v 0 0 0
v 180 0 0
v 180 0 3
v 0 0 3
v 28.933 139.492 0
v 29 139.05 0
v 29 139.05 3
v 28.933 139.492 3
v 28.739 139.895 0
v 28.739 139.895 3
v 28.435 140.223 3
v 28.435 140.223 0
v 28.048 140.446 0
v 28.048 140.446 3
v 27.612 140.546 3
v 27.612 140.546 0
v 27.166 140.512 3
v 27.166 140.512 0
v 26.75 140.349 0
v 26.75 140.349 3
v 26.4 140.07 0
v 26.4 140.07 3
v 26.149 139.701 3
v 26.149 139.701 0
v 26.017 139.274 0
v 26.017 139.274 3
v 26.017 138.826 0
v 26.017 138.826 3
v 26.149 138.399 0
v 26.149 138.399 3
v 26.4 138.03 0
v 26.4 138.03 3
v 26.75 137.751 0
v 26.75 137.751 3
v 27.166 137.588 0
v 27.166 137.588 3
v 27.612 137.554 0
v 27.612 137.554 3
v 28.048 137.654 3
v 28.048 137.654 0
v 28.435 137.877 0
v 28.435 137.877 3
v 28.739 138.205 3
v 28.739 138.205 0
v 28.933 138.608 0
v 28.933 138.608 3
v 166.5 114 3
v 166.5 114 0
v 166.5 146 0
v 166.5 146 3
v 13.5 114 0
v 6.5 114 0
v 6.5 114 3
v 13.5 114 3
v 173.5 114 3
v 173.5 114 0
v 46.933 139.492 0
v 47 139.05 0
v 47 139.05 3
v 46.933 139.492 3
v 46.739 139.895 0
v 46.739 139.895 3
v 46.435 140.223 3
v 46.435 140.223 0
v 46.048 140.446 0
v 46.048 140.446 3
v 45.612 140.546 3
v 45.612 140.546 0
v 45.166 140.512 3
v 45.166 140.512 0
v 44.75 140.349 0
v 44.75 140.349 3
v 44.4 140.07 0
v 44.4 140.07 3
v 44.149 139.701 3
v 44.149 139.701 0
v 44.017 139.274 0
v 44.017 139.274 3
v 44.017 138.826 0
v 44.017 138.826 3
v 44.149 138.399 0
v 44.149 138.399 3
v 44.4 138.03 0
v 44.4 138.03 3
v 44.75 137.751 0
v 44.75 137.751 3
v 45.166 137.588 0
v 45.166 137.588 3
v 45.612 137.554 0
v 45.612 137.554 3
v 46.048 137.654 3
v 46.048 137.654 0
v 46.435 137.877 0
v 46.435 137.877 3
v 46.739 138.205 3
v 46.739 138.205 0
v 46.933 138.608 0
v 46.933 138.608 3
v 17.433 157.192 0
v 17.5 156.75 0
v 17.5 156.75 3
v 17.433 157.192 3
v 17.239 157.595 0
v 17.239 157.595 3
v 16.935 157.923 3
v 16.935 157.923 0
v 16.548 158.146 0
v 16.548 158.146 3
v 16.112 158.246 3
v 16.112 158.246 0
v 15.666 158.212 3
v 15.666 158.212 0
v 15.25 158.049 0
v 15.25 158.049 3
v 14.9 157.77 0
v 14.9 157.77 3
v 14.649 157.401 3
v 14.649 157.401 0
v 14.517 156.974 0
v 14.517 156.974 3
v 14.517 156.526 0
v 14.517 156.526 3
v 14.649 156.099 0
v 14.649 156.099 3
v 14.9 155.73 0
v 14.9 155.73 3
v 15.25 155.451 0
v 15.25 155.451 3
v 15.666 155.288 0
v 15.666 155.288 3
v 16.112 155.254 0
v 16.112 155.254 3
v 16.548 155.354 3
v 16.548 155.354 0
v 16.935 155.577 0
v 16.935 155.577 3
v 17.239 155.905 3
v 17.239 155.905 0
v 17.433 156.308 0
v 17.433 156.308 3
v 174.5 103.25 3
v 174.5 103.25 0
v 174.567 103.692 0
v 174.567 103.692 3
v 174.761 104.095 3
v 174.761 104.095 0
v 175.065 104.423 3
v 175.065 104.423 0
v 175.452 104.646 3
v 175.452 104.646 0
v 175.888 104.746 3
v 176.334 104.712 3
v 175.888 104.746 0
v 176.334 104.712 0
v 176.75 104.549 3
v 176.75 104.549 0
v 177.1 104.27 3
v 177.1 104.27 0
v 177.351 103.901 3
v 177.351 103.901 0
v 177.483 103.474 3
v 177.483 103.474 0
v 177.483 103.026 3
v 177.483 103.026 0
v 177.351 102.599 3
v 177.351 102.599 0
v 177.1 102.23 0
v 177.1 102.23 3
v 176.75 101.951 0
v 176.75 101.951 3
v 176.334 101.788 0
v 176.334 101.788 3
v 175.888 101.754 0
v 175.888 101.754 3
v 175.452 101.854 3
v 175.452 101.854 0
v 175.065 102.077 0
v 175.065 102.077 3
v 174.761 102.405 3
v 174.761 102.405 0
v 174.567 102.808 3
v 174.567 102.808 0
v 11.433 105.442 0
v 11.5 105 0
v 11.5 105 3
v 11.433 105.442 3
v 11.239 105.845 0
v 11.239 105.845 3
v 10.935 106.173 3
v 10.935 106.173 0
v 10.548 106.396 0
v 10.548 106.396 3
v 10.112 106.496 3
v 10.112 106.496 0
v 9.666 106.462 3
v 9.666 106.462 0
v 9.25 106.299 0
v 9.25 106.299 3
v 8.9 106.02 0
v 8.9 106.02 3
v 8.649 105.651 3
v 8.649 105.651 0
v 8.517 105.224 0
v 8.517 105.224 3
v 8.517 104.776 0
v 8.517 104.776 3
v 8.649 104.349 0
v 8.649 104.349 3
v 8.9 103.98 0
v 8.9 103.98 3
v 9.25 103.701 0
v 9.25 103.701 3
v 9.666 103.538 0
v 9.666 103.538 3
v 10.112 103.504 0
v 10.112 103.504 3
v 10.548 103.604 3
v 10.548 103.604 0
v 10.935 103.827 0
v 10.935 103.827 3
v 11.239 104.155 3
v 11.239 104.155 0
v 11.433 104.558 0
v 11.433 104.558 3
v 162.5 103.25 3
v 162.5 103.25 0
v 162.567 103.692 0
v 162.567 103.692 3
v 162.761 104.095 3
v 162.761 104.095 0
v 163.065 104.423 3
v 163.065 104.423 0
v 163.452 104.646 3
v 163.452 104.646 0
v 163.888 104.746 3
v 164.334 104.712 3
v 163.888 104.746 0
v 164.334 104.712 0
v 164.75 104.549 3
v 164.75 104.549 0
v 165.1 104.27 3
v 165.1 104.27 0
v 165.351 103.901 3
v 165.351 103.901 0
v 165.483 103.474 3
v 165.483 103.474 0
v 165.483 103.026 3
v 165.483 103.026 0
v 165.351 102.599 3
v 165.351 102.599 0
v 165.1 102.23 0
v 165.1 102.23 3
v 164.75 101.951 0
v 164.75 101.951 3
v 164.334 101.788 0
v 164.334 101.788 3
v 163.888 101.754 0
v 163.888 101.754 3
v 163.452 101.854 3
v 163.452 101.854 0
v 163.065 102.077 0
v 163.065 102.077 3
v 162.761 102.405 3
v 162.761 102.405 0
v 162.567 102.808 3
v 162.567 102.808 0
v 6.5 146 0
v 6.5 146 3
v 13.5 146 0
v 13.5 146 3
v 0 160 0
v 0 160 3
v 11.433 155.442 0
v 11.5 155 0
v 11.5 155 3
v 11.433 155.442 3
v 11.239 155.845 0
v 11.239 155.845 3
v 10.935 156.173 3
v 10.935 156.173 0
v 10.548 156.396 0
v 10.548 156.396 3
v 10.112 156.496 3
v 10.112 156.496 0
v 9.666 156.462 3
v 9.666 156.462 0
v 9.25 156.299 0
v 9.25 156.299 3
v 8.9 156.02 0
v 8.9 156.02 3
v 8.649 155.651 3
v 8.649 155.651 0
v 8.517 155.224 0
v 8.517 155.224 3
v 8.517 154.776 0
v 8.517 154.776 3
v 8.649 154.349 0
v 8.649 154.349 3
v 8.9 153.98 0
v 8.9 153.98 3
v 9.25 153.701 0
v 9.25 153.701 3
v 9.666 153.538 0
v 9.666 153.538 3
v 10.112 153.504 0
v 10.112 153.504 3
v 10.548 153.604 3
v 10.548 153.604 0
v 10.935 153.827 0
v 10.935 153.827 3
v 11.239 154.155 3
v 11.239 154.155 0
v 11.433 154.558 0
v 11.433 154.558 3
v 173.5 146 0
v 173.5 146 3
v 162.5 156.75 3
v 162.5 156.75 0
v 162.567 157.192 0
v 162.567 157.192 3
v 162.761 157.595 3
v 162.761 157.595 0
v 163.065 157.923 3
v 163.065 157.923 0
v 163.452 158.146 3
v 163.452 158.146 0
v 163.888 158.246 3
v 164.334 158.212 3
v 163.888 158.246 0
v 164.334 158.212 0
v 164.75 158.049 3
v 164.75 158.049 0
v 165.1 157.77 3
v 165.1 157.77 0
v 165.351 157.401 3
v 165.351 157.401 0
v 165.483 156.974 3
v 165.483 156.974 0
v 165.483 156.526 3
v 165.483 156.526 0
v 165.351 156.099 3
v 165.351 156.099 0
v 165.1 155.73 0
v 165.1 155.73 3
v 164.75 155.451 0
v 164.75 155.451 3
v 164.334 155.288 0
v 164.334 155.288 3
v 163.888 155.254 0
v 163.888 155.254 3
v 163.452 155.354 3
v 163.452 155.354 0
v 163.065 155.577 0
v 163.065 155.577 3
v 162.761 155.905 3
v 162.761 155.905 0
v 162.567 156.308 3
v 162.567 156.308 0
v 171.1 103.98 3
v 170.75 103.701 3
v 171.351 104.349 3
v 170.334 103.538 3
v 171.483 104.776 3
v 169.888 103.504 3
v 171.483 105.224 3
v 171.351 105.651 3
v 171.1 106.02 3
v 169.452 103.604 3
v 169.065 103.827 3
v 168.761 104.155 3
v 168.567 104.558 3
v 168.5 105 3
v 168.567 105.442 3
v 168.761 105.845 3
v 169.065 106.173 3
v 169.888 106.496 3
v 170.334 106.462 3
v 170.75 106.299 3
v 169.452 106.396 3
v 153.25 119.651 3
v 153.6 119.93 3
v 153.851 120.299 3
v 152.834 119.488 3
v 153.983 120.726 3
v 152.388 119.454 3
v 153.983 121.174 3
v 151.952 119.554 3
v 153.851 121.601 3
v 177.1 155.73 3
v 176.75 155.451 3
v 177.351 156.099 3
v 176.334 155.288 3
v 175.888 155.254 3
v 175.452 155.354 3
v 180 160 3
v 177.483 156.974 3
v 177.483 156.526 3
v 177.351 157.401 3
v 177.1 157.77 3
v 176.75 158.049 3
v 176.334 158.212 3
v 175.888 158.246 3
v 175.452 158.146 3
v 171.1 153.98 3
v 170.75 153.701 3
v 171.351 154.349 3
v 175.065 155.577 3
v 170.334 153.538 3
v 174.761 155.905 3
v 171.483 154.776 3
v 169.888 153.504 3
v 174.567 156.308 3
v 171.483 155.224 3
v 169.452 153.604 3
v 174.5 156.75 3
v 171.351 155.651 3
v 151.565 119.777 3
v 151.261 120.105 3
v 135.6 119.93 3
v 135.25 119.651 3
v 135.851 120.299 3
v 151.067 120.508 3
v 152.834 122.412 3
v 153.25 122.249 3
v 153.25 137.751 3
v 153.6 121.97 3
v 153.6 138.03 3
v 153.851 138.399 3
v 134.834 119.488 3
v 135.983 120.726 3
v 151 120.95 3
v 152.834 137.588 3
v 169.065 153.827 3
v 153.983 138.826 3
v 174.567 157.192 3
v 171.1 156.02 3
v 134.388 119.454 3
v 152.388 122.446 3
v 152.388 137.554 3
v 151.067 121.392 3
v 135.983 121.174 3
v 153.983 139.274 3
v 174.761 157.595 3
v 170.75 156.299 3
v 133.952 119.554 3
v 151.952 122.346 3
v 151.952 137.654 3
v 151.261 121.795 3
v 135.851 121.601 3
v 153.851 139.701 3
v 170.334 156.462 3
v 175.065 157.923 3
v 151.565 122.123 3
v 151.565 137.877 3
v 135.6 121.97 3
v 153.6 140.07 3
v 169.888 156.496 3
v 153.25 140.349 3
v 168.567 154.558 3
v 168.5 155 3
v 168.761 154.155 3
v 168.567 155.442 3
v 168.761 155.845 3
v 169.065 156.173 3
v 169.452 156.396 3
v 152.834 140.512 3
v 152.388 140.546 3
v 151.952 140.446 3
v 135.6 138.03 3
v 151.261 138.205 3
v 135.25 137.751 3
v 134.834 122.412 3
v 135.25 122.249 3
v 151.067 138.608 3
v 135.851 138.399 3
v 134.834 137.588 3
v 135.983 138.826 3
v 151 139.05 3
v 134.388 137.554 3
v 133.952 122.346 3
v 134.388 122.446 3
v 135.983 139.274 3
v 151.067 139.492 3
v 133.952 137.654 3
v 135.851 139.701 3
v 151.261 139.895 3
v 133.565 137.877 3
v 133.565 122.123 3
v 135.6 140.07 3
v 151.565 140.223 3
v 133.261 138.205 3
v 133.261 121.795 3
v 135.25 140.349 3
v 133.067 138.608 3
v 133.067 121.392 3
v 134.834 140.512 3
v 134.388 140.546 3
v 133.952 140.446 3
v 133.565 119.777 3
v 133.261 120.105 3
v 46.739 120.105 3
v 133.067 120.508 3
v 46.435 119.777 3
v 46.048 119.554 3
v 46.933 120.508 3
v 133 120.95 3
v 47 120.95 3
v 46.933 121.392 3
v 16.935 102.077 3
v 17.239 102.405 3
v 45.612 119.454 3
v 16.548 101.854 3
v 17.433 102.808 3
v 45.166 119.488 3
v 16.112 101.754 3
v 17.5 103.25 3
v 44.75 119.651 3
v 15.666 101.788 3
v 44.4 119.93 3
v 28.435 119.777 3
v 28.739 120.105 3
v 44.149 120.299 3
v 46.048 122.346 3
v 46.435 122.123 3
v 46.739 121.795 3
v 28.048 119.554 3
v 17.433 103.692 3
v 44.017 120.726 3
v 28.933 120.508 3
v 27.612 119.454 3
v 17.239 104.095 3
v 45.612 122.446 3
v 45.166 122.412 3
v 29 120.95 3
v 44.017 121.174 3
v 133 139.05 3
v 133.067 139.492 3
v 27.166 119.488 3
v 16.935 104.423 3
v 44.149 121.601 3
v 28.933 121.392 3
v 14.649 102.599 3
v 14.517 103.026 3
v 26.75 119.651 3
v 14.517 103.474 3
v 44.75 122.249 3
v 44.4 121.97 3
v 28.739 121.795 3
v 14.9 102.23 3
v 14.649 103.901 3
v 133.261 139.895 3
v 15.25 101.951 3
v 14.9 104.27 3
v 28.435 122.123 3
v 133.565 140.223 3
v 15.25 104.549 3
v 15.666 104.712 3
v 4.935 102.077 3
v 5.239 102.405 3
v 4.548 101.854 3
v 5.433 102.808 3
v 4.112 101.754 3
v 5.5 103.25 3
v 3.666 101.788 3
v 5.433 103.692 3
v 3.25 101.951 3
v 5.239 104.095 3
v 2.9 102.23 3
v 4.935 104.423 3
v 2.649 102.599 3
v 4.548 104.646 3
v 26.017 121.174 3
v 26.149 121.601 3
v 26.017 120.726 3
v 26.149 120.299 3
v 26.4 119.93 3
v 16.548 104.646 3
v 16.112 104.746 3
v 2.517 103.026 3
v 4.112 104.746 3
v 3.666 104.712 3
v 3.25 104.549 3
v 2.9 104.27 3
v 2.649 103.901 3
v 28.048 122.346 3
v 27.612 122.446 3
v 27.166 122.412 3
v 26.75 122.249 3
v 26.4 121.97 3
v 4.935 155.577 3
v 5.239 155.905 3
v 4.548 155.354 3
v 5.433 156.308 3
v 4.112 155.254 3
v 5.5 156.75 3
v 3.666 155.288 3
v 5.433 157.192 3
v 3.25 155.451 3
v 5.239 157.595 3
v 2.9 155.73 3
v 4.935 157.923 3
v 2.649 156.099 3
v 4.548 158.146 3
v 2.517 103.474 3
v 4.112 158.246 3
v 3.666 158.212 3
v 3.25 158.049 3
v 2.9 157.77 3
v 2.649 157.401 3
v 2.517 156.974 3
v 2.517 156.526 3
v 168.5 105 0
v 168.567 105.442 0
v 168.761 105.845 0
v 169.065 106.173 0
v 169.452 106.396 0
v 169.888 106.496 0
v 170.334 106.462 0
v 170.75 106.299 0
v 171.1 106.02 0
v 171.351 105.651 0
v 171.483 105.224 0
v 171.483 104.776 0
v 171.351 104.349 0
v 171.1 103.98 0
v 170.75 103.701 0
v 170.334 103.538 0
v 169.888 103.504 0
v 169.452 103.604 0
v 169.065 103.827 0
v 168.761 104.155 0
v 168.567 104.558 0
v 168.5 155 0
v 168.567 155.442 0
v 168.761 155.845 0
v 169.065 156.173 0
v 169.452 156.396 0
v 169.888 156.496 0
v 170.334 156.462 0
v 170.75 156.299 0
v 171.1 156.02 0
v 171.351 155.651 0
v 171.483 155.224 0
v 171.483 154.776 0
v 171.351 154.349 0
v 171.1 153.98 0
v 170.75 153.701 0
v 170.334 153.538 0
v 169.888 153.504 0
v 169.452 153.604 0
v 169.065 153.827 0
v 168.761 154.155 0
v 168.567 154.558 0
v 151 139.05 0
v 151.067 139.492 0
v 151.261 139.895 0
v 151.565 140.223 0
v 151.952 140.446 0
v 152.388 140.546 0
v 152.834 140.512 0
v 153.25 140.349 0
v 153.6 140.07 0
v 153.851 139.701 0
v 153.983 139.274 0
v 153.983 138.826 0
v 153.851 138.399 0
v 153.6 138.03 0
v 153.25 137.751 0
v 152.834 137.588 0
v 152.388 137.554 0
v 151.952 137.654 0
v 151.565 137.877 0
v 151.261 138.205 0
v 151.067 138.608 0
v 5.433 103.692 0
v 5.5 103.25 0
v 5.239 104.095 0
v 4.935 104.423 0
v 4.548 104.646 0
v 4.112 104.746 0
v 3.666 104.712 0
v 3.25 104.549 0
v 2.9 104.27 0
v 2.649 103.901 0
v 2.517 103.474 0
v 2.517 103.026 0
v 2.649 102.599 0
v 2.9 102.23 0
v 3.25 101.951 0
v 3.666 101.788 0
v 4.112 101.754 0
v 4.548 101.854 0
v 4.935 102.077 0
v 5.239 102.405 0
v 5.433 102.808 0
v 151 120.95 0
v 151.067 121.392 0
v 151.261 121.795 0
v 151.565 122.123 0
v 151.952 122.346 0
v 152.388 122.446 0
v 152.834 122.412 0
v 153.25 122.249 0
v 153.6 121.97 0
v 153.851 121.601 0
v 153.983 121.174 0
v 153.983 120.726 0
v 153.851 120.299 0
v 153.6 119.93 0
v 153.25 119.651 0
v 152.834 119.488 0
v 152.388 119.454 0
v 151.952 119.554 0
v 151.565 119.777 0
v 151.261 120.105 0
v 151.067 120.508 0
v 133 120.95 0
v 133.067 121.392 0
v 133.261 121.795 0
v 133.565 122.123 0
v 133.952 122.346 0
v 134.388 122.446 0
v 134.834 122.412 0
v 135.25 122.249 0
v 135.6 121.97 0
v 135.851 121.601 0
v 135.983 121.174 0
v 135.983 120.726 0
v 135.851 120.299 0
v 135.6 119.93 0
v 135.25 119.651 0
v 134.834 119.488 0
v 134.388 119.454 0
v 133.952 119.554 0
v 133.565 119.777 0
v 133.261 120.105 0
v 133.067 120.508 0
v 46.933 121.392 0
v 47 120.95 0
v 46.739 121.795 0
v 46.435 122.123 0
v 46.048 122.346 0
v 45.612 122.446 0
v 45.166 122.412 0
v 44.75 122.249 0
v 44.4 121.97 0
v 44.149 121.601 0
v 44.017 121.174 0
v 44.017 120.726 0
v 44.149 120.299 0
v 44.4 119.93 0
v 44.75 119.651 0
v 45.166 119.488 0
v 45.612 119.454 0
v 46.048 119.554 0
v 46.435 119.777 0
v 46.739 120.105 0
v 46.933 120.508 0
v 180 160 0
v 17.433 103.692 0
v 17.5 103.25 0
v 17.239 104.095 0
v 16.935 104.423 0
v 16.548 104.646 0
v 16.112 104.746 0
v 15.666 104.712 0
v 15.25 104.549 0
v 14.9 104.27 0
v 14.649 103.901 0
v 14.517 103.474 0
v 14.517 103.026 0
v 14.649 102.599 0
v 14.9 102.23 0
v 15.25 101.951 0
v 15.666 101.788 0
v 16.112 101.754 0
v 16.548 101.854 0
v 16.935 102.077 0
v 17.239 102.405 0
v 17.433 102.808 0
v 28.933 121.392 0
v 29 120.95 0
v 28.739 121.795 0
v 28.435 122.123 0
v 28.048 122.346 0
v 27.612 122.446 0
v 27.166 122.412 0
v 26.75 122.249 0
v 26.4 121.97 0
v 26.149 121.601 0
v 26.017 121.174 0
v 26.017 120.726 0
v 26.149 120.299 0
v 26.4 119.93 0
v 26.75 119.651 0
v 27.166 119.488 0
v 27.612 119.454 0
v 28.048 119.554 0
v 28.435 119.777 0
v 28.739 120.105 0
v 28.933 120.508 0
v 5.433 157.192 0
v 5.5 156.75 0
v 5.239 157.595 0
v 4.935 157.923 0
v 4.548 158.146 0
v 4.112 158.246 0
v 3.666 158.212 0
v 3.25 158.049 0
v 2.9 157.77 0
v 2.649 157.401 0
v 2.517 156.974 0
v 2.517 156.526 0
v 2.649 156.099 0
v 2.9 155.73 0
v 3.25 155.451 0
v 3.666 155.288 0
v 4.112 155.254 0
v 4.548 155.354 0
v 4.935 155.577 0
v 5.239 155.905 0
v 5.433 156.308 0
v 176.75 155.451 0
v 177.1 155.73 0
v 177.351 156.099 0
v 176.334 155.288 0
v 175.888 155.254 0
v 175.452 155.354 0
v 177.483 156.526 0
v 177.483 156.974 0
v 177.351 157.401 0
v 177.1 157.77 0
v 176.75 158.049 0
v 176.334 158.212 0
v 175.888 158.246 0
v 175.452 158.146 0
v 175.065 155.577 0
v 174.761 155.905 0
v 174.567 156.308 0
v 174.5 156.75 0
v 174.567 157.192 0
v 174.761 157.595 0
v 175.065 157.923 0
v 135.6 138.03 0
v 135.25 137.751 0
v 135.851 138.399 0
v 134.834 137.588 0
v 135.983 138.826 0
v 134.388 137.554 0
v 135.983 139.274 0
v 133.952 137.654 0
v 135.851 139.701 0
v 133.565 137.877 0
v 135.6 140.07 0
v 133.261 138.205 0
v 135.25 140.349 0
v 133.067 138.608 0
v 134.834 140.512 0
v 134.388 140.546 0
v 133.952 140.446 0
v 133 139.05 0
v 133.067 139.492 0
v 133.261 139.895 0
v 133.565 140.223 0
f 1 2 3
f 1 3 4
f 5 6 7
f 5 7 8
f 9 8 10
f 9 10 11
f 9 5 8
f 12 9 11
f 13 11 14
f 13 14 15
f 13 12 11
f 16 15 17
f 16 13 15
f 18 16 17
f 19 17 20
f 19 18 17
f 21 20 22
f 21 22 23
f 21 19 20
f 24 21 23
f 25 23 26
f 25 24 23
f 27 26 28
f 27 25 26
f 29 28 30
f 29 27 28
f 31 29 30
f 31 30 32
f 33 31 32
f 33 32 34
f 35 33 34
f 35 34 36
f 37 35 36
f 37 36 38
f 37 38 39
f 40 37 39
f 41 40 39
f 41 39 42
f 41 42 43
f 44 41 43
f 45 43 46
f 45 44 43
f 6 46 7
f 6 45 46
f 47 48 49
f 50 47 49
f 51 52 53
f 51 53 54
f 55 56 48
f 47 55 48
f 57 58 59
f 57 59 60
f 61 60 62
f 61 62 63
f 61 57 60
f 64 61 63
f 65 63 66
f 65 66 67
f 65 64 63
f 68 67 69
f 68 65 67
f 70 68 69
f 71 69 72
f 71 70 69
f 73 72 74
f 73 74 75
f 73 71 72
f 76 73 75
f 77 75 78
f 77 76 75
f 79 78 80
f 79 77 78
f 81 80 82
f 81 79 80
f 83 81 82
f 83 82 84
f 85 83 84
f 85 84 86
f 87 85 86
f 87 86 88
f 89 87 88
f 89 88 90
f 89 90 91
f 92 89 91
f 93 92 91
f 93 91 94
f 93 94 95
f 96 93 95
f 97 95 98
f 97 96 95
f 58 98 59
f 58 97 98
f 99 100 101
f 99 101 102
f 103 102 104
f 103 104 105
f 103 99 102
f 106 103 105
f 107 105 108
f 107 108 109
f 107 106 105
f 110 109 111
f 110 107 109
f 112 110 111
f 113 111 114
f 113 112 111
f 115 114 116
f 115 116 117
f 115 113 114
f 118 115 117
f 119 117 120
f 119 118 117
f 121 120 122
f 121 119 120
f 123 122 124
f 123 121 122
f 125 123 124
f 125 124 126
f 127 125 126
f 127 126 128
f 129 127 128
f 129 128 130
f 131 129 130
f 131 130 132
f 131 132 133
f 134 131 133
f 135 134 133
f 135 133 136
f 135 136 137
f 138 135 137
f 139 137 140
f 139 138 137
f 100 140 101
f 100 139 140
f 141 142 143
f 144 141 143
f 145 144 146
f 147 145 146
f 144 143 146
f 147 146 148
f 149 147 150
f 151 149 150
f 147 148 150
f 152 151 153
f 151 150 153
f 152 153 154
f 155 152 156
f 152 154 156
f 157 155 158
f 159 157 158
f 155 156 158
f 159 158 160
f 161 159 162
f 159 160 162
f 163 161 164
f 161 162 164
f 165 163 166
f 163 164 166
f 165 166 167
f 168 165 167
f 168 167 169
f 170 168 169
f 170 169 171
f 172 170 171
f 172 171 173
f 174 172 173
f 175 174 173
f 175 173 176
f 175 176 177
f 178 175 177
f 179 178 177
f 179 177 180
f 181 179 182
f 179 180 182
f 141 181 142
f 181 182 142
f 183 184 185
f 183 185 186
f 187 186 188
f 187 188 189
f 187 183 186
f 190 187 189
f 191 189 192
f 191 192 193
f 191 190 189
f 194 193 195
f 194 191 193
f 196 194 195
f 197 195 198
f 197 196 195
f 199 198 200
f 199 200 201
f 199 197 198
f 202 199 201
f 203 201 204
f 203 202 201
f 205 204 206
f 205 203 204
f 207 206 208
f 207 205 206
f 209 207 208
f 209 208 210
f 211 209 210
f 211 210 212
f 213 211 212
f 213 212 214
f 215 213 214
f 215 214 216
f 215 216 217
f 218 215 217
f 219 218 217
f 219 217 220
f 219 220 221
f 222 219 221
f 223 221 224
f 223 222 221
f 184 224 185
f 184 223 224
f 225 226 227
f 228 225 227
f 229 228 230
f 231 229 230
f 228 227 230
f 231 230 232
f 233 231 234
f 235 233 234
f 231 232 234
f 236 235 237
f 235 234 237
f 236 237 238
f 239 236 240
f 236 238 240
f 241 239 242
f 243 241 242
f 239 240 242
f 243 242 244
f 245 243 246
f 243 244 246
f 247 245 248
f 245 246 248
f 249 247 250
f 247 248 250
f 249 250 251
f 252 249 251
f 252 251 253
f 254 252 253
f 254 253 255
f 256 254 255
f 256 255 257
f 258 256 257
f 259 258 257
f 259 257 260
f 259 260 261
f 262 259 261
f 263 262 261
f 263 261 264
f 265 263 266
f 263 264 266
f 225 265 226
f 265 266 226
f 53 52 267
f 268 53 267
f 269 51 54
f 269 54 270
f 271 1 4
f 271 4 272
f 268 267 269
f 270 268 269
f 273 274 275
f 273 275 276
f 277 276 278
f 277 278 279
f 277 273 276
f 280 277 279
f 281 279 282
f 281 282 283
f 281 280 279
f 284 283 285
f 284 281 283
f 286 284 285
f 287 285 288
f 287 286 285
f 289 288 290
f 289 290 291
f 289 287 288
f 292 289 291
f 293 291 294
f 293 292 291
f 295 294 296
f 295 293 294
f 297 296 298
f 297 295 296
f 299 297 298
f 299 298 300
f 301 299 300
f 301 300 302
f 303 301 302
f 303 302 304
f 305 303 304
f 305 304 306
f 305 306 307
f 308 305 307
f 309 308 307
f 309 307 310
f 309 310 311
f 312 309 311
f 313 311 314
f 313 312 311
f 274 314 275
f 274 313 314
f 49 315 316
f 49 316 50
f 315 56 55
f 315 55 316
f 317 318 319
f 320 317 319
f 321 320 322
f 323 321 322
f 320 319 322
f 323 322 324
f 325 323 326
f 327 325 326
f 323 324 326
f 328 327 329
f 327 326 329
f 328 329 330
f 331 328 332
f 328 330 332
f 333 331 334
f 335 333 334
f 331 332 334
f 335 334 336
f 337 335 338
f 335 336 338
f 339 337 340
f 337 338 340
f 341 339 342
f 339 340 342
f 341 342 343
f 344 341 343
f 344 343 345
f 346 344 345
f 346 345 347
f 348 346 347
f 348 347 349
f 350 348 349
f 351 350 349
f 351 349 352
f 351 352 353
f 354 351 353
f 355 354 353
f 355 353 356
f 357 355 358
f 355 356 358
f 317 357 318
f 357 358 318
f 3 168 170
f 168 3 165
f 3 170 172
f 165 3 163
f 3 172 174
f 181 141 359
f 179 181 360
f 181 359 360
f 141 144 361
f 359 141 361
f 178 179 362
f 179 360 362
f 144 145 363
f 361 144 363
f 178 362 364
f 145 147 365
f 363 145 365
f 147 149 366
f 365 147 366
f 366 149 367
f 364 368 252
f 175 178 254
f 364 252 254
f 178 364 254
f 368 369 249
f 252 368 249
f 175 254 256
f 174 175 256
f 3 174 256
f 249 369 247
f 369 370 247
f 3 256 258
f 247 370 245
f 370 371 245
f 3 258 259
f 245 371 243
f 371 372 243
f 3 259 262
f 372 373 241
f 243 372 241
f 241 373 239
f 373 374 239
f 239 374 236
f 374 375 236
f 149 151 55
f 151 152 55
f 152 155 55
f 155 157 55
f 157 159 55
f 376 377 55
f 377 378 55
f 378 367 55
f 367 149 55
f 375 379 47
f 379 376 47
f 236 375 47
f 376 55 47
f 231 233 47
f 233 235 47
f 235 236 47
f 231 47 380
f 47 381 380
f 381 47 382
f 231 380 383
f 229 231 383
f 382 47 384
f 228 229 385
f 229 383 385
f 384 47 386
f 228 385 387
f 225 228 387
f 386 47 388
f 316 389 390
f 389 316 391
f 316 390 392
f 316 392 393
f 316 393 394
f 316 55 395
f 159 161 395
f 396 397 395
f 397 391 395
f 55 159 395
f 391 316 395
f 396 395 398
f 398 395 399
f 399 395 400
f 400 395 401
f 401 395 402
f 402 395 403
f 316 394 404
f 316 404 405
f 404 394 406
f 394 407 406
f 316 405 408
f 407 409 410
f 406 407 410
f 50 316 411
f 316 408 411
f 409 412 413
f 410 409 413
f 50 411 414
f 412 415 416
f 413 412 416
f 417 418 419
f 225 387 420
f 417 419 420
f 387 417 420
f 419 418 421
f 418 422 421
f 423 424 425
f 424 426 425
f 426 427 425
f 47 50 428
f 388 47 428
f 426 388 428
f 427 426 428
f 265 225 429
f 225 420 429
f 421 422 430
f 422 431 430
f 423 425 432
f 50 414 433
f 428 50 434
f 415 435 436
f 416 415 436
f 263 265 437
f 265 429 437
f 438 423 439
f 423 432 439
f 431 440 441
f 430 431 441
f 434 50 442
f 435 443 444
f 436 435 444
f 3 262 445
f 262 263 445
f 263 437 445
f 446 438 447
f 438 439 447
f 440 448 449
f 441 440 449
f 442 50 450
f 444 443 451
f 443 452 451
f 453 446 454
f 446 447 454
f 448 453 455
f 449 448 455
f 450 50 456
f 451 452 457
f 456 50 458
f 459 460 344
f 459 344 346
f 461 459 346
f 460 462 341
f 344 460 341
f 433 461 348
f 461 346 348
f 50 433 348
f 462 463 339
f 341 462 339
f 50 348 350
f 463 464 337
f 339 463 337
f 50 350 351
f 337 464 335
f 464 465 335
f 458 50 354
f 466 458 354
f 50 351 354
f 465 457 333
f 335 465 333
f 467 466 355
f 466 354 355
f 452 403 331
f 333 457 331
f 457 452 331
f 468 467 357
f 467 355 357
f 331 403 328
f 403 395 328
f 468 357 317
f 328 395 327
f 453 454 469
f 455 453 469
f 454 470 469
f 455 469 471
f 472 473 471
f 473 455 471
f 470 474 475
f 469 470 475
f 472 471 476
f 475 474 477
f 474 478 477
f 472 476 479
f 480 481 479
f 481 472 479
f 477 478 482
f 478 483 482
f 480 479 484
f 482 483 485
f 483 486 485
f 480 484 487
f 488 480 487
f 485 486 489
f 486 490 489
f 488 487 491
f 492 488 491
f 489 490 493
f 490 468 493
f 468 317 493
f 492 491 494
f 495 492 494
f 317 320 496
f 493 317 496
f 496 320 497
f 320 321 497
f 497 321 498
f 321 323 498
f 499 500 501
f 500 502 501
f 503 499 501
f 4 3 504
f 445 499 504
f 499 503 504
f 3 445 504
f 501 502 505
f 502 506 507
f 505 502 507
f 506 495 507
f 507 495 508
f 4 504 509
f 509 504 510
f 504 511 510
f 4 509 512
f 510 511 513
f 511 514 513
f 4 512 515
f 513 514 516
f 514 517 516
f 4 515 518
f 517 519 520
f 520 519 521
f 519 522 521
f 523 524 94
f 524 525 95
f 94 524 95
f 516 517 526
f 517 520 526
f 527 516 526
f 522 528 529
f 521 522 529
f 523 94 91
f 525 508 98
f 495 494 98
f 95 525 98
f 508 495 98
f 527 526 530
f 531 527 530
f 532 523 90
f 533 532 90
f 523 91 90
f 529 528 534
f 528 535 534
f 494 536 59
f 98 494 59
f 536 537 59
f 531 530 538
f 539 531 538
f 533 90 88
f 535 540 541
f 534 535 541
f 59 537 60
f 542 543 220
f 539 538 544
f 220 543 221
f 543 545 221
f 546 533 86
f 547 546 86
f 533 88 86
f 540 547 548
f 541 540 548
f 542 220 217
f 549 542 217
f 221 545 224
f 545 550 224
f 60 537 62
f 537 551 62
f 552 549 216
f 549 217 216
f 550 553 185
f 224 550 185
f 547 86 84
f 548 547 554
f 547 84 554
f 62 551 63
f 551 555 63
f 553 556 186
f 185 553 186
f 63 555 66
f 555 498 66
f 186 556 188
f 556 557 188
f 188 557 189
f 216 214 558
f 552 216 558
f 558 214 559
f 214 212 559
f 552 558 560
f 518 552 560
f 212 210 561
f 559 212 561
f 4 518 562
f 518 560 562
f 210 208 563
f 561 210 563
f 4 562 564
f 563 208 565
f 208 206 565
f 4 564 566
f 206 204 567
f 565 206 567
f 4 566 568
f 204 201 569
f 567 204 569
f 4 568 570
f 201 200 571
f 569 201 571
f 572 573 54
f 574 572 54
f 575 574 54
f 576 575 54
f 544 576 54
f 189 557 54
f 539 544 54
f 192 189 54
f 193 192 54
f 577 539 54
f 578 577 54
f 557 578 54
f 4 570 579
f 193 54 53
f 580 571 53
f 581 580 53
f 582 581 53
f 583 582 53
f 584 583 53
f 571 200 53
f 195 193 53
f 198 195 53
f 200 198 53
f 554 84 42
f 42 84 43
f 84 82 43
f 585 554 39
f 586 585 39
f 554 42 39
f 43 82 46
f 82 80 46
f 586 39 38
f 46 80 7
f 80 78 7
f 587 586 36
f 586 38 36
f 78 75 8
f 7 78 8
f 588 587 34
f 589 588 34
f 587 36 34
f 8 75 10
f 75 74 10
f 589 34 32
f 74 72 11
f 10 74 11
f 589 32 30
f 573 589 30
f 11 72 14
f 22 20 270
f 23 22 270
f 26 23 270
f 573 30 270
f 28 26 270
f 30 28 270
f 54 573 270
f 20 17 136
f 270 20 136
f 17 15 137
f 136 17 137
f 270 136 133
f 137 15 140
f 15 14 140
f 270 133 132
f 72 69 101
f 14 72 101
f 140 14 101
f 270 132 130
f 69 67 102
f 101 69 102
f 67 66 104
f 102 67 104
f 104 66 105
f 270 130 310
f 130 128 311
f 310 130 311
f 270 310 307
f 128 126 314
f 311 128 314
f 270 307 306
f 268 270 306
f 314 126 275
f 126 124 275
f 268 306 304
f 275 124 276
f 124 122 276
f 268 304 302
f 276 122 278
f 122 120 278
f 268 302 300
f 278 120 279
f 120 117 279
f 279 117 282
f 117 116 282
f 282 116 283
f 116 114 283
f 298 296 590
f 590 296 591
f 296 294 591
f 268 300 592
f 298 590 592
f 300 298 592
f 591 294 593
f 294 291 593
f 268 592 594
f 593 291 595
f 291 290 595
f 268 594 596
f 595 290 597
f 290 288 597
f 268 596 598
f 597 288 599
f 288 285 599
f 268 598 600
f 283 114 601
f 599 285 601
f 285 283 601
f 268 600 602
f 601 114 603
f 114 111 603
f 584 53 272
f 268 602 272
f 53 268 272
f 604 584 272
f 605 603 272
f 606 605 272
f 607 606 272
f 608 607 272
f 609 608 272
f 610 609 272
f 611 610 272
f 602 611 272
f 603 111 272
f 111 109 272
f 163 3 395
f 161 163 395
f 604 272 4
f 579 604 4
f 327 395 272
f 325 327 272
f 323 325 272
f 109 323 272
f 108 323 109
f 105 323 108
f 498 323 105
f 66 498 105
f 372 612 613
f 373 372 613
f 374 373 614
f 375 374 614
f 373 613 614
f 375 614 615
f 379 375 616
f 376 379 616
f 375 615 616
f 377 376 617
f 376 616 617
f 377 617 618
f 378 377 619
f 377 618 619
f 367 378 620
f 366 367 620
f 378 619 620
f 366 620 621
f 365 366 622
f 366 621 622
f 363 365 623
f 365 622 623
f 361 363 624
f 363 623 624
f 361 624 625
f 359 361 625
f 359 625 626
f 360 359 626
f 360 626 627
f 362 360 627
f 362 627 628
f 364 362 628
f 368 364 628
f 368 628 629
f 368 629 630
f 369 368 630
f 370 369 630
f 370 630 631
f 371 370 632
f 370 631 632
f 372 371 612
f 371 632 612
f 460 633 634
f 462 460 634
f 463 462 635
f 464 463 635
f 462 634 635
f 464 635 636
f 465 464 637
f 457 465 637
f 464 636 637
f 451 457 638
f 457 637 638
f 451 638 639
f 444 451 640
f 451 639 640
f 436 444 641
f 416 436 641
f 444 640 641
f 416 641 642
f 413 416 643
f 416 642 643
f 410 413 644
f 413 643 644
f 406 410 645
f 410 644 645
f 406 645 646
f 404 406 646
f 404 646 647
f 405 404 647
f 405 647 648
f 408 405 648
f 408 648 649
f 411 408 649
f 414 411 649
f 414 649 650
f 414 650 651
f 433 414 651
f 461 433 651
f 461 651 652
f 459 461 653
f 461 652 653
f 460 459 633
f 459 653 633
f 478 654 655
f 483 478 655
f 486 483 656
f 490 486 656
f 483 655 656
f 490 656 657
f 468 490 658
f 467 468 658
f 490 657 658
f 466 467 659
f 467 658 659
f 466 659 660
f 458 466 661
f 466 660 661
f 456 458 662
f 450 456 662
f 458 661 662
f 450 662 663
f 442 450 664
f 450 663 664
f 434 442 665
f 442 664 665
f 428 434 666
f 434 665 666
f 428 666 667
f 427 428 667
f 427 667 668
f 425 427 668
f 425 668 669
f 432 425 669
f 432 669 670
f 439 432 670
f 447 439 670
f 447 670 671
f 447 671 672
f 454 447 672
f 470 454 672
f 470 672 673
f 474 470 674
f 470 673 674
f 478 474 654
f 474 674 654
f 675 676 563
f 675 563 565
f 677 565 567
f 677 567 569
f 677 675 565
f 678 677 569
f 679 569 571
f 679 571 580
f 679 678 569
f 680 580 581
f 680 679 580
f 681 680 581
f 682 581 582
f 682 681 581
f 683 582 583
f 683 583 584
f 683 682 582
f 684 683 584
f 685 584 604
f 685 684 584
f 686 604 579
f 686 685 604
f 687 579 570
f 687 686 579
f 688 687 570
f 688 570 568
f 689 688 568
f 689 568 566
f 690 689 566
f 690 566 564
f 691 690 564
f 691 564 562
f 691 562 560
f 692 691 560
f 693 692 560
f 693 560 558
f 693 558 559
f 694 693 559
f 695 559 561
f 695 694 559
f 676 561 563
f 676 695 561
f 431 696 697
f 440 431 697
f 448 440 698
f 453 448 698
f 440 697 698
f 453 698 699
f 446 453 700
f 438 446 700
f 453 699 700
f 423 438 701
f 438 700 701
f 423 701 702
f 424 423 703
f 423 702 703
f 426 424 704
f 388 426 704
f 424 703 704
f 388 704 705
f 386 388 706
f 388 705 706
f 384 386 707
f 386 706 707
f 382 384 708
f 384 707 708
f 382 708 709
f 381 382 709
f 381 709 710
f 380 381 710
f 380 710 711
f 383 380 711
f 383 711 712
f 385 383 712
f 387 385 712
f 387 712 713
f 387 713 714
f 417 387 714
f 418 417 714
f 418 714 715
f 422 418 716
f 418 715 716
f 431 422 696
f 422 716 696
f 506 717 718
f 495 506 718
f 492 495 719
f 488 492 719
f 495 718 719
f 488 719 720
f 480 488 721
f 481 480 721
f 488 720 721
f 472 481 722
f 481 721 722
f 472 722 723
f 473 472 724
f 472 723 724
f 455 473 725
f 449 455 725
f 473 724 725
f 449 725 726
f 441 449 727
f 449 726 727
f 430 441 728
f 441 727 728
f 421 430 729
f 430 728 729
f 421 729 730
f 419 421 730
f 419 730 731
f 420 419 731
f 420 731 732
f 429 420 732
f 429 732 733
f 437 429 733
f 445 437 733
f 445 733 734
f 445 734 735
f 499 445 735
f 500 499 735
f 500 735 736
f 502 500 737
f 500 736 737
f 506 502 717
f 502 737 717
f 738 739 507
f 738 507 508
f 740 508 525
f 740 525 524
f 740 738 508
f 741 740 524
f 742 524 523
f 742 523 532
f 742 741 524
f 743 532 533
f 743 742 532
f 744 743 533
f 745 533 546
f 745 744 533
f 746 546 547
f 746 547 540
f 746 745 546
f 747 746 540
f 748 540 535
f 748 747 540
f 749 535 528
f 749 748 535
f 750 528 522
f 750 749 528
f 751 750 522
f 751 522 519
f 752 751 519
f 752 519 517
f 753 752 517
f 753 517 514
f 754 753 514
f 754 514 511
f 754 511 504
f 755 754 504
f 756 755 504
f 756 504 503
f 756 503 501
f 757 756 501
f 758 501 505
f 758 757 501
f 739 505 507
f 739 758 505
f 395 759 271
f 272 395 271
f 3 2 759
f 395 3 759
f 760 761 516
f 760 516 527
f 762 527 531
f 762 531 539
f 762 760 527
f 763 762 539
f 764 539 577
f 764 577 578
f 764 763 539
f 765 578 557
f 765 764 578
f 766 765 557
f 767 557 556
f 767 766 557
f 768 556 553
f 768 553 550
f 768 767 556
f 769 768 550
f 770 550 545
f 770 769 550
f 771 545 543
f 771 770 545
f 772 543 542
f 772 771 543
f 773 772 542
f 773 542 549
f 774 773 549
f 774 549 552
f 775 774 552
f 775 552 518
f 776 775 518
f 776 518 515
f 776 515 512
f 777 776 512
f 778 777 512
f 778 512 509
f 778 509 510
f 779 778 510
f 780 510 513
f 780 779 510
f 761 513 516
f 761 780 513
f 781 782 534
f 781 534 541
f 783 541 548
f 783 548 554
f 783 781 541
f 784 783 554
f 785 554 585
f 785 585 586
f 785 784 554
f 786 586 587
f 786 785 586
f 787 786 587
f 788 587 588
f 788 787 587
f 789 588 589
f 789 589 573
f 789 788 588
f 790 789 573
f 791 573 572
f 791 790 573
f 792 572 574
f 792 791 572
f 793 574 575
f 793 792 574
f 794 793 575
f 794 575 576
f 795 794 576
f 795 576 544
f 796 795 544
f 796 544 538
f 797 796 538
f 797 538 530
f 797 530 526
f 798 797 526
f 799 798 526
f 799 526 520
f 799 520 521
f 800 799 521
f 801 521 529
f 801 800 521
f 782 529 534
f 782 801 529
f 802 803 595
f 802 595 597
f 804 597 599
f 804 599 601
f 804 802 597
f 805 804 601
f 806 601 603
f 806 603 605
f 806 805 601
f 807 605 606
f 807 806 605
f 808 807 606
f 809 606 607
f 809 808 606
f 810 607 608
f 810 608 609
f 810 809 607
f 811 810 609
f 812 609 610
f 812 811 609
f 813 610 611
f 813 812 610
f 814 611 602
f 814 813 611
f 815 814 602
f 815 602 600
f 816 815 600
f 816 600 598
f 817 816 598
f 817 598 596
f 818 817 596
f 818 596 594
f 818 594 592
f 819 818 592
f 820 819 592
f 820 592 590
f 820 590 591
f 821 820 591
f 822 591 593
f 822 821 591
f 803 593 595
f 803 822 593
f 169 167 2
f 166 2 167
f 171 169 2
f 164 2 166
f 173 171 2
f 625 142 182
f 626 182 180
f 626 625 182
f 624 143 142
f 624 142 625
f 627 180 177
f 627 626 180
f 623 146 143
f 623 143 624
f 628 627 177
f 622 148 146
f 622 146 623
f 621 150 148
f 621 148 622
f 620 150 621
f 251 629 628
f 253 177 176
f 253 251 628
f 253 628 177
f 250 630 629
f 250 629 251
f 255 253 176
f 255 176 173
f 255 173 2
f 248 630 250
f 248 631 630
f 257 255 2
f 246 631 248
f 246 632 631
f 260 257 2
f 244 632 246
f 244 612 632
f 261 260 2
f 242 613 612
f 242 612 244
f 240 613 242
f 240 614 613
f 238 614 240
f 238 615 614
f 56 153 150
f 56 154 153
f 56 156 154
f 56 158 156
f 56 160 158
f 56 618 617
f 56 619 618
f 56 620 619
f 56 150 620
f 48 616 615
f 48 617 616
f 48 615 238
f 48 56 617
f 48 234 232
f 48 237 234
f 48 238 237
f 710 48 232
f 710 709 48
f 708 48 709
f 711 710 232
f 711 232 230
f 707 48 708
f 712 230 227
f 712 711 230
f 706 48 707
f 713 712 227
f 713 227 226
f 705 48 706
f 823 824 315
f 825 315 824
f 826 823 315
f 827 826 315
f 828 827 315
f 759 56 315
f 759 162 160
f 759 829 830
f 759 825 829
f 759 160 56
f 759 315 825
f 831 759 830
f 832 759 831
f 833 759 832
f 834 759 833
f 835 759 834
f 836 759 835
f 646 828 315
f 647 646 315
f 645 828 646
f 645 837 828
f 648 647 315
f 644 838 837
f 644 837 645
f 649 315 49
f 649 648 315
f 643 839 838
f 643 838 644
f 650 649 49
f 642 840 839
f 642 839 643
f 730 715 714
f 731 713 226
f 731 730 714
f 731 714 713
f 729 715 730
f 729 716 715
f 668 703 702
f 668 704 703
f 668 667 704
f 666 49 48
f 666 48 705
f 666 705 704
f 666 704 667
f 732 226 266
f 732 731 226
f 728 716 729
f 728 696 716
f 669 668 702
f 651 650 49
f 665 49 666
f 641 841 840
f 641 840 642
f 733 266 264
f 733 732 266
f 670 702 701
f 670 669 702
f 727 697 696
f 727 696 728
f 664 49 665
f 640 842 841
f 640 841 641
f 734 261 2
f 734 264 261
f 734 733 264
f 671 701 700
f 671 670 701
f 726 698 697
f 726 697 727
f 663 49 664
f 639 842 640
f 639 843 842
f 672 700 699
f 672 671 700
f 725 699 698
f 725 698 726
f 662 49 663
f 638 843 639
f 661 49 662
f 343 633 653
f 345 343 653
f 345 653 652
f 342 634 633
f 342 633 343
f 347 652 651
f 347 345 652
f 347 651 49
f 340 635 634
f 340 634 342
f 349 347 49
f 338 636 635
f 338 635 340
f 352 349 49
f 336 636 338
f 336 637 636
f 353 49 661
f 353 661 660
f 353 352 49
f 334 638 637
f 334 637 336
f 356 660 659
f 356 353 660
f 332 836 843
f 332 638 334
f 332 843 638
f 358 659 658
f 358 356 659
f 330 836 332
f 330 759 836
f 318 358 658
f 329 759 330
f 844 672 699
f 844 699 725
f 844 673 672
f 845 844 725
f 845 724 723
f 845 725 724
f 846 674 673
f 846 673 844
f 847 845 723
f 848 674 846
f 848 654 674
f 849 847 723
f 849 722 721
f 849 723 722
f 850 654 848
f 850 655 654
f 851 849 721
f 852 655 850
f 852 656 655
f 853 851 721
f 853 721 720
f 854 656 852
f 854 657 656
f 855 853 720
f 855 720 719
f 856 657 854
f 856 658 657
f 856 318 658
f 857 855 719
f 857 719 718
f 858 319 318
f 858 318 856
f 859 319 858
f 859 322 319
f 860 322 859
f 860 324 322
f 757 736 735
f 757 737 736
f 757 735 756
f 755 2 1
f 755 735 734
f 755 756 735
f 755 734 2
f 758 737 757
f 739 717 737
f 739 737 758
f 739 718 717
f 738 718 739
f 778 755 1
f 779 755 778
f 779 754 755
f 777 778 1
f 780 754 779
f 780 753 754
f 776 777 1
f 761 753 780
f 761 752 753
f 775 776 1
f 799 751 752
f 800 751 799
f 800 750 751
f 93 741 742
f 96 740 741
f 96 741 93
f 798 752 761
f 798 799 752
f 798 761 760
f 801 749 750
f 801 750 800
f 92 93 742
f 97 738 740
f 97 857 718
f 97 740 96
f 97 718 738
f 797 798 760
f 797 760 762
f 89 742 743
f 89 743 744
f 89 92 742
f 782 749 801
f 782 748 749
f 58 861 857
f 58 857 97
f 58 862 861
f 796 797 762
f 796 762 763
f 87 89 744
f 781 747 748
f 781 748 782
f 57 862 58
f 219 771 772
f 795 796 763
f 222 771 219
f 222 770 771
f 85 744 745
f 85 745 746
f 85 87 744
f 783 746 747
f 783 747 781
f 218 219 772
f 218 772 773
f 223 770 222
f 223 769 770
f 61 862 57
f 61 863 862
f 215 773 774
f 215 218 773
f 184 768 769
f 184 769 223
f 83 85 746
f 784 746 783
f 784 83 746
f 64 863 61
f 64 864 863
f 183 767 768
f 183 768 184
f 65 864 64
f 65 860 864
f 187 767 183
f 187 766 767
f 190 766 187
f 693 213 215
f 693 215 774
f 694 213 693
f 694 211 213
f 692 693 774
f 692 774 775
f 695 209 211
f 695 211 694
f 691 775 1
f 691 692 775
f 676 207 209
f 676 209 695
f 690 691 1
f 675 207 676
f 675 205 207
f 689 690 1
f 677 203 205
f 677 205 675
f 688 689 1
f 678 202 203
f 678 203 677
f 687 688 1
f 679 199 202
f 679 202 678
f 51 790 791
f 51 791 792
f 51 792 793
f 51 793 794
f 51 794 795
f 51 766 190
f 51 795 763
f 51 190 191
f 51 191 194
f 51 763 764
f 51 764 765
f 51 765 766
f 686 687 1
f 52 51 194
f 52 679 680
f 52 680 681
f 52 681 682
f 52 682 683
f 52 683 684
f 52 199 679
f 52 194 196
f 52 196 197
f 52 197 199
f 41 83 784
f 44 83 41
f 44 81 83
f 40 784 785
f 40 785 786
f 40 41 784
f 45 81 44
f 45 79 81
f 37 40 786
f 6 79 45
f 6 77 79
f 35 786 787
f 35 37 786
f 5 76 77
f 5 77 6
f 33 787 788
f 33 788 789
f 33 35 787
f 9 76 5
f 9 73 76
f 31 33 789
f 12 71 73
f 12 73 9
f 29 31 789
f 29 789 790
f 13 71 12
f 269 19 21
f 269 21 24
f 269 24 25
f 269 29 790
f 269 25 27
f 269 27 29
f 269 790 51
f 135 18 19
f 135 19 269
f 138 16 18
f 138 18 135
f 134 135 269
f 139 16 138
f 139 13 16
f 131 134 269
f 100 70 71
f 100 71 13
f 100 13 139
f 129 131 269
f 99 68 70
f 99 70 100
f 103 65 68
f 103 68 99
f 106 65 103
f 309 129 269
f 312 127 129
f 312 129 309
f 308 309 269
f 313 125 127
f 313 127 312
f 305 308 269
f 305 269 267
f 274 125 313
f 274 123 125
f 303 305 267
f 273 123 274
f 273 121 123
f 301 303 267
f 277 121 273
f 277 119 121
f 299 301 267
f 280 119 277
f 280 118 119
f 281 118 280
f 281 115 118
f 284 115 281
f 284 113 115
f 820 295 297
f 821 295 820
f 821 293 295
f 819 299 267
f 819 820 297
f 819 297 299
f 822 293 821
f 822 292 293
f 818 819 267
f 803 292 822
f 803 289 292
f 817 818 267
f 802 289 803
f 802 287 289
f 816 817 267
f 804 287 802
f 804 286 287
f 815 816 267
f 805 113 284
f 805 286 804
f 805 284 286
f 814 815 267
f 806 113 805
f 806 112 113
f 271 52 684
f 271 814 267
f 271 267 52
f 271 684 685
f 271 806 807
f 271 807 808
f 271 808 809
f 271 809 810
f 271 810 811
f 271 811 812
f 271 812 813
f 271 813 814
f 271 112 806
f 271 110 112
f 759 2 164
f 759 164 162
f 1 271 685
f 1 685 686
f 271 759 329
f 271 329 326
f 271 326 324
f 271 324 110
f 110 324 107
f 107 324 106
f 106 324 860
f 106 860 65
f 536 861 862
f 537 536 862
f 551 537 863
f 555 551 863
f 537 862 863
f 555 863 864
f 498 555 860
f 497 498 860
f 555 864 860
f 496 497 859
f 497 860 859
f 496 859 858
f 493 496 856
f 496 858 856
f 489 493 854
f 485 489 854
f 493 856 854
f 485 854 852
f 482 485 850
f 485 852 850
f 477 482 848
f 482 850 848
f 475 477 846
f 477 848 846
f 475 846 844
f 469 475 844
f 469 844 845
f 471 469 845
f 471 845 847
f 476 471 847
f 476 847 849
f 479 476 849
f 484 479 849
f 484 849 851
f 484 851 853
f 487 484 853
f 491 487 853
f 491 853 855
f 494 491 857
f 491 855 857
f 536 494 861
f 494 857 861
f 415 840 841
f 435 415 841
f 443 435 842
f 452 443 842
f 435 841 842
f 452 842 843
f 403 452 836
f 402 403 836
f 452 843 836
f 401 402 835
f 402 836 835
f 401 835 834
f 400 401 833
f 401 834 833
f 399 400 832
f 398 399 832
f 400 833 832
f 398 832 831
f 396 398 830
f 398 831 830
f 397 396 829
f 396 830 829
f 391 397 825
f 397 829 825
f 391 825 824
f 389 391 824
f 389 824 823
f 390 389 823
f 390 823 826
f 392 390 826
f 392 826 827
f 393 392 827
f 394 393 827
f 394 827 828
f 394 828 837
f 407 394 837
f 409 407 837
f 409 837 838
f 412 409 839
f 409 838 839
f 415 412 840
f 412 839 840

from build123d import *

# Parameters (mm, degrees)
SKETCH_W   = 90
SKETCH_H   = 160
SKETCH_R   = 1.5
SKETCH_W_2 = 7
SKETCH_H_2 = 32
PAD_DEPTH  = 3


with BuildPart() as part:
    # Sketch → Pad (new body)
    with BuildSketch(Plane.XY):
        with Locations((45, 80)):
            Rectangle(SKETCH_W, SKETCH_H)
        with Locations((10, 155)):
            Circle(SKETCH_R, mode=Mode.SUBTRACT)
        with Locations((10, 105)):
            Circle(SKETCH_R, mode=Mode.SUBTRACT)
        with Locations((27.5, 139.05)):
            Circle(SKETCH_R, mode=Mode.SUBTRACT)
        with Locations((45.5, 139.05)):
            Circle(SKETCH_R, mode=Mode.SUBTRACT)
        with Locations((27.5, 120.95)):
            Circle(SKETCH_R, mode=Mode.SUBTRACT)
        with Locations((45.5, 120.95)):
            Circle(SKETCH_R, mode=Mode.SUBTRACT)
        with Locations((4, 156.75)):
            Circle(SKETCH_R, mode=Mode.SUBTRACT)
        with Locations((16, 156.75)):
            Circle(SKETCH_R, mode=Mode.SUBTRACT)
        with Locations((4, 103.25)):
            Circle(SKETCH_R, mode=Mode.SUBTRACT)
        with Locations((16, 103.25)):
            Circle(SKETCH_R, mode=Mode.SUBTRACT)
        with Locations((10, 130)):
            Rectangle(SKETCH_W_2, SKETCH_H_2, mode=Mode.SUBTRACT)
    pad = extrude(amount=PAD_DEPTH)

    # Mirrored: Pad across face of Pad
    add(pad.mirror(Plane(origin=(90, 80, 1.5), x_dir=(0, 1, 0), z_dir=(1, 0, 0))))


solid = part.part
